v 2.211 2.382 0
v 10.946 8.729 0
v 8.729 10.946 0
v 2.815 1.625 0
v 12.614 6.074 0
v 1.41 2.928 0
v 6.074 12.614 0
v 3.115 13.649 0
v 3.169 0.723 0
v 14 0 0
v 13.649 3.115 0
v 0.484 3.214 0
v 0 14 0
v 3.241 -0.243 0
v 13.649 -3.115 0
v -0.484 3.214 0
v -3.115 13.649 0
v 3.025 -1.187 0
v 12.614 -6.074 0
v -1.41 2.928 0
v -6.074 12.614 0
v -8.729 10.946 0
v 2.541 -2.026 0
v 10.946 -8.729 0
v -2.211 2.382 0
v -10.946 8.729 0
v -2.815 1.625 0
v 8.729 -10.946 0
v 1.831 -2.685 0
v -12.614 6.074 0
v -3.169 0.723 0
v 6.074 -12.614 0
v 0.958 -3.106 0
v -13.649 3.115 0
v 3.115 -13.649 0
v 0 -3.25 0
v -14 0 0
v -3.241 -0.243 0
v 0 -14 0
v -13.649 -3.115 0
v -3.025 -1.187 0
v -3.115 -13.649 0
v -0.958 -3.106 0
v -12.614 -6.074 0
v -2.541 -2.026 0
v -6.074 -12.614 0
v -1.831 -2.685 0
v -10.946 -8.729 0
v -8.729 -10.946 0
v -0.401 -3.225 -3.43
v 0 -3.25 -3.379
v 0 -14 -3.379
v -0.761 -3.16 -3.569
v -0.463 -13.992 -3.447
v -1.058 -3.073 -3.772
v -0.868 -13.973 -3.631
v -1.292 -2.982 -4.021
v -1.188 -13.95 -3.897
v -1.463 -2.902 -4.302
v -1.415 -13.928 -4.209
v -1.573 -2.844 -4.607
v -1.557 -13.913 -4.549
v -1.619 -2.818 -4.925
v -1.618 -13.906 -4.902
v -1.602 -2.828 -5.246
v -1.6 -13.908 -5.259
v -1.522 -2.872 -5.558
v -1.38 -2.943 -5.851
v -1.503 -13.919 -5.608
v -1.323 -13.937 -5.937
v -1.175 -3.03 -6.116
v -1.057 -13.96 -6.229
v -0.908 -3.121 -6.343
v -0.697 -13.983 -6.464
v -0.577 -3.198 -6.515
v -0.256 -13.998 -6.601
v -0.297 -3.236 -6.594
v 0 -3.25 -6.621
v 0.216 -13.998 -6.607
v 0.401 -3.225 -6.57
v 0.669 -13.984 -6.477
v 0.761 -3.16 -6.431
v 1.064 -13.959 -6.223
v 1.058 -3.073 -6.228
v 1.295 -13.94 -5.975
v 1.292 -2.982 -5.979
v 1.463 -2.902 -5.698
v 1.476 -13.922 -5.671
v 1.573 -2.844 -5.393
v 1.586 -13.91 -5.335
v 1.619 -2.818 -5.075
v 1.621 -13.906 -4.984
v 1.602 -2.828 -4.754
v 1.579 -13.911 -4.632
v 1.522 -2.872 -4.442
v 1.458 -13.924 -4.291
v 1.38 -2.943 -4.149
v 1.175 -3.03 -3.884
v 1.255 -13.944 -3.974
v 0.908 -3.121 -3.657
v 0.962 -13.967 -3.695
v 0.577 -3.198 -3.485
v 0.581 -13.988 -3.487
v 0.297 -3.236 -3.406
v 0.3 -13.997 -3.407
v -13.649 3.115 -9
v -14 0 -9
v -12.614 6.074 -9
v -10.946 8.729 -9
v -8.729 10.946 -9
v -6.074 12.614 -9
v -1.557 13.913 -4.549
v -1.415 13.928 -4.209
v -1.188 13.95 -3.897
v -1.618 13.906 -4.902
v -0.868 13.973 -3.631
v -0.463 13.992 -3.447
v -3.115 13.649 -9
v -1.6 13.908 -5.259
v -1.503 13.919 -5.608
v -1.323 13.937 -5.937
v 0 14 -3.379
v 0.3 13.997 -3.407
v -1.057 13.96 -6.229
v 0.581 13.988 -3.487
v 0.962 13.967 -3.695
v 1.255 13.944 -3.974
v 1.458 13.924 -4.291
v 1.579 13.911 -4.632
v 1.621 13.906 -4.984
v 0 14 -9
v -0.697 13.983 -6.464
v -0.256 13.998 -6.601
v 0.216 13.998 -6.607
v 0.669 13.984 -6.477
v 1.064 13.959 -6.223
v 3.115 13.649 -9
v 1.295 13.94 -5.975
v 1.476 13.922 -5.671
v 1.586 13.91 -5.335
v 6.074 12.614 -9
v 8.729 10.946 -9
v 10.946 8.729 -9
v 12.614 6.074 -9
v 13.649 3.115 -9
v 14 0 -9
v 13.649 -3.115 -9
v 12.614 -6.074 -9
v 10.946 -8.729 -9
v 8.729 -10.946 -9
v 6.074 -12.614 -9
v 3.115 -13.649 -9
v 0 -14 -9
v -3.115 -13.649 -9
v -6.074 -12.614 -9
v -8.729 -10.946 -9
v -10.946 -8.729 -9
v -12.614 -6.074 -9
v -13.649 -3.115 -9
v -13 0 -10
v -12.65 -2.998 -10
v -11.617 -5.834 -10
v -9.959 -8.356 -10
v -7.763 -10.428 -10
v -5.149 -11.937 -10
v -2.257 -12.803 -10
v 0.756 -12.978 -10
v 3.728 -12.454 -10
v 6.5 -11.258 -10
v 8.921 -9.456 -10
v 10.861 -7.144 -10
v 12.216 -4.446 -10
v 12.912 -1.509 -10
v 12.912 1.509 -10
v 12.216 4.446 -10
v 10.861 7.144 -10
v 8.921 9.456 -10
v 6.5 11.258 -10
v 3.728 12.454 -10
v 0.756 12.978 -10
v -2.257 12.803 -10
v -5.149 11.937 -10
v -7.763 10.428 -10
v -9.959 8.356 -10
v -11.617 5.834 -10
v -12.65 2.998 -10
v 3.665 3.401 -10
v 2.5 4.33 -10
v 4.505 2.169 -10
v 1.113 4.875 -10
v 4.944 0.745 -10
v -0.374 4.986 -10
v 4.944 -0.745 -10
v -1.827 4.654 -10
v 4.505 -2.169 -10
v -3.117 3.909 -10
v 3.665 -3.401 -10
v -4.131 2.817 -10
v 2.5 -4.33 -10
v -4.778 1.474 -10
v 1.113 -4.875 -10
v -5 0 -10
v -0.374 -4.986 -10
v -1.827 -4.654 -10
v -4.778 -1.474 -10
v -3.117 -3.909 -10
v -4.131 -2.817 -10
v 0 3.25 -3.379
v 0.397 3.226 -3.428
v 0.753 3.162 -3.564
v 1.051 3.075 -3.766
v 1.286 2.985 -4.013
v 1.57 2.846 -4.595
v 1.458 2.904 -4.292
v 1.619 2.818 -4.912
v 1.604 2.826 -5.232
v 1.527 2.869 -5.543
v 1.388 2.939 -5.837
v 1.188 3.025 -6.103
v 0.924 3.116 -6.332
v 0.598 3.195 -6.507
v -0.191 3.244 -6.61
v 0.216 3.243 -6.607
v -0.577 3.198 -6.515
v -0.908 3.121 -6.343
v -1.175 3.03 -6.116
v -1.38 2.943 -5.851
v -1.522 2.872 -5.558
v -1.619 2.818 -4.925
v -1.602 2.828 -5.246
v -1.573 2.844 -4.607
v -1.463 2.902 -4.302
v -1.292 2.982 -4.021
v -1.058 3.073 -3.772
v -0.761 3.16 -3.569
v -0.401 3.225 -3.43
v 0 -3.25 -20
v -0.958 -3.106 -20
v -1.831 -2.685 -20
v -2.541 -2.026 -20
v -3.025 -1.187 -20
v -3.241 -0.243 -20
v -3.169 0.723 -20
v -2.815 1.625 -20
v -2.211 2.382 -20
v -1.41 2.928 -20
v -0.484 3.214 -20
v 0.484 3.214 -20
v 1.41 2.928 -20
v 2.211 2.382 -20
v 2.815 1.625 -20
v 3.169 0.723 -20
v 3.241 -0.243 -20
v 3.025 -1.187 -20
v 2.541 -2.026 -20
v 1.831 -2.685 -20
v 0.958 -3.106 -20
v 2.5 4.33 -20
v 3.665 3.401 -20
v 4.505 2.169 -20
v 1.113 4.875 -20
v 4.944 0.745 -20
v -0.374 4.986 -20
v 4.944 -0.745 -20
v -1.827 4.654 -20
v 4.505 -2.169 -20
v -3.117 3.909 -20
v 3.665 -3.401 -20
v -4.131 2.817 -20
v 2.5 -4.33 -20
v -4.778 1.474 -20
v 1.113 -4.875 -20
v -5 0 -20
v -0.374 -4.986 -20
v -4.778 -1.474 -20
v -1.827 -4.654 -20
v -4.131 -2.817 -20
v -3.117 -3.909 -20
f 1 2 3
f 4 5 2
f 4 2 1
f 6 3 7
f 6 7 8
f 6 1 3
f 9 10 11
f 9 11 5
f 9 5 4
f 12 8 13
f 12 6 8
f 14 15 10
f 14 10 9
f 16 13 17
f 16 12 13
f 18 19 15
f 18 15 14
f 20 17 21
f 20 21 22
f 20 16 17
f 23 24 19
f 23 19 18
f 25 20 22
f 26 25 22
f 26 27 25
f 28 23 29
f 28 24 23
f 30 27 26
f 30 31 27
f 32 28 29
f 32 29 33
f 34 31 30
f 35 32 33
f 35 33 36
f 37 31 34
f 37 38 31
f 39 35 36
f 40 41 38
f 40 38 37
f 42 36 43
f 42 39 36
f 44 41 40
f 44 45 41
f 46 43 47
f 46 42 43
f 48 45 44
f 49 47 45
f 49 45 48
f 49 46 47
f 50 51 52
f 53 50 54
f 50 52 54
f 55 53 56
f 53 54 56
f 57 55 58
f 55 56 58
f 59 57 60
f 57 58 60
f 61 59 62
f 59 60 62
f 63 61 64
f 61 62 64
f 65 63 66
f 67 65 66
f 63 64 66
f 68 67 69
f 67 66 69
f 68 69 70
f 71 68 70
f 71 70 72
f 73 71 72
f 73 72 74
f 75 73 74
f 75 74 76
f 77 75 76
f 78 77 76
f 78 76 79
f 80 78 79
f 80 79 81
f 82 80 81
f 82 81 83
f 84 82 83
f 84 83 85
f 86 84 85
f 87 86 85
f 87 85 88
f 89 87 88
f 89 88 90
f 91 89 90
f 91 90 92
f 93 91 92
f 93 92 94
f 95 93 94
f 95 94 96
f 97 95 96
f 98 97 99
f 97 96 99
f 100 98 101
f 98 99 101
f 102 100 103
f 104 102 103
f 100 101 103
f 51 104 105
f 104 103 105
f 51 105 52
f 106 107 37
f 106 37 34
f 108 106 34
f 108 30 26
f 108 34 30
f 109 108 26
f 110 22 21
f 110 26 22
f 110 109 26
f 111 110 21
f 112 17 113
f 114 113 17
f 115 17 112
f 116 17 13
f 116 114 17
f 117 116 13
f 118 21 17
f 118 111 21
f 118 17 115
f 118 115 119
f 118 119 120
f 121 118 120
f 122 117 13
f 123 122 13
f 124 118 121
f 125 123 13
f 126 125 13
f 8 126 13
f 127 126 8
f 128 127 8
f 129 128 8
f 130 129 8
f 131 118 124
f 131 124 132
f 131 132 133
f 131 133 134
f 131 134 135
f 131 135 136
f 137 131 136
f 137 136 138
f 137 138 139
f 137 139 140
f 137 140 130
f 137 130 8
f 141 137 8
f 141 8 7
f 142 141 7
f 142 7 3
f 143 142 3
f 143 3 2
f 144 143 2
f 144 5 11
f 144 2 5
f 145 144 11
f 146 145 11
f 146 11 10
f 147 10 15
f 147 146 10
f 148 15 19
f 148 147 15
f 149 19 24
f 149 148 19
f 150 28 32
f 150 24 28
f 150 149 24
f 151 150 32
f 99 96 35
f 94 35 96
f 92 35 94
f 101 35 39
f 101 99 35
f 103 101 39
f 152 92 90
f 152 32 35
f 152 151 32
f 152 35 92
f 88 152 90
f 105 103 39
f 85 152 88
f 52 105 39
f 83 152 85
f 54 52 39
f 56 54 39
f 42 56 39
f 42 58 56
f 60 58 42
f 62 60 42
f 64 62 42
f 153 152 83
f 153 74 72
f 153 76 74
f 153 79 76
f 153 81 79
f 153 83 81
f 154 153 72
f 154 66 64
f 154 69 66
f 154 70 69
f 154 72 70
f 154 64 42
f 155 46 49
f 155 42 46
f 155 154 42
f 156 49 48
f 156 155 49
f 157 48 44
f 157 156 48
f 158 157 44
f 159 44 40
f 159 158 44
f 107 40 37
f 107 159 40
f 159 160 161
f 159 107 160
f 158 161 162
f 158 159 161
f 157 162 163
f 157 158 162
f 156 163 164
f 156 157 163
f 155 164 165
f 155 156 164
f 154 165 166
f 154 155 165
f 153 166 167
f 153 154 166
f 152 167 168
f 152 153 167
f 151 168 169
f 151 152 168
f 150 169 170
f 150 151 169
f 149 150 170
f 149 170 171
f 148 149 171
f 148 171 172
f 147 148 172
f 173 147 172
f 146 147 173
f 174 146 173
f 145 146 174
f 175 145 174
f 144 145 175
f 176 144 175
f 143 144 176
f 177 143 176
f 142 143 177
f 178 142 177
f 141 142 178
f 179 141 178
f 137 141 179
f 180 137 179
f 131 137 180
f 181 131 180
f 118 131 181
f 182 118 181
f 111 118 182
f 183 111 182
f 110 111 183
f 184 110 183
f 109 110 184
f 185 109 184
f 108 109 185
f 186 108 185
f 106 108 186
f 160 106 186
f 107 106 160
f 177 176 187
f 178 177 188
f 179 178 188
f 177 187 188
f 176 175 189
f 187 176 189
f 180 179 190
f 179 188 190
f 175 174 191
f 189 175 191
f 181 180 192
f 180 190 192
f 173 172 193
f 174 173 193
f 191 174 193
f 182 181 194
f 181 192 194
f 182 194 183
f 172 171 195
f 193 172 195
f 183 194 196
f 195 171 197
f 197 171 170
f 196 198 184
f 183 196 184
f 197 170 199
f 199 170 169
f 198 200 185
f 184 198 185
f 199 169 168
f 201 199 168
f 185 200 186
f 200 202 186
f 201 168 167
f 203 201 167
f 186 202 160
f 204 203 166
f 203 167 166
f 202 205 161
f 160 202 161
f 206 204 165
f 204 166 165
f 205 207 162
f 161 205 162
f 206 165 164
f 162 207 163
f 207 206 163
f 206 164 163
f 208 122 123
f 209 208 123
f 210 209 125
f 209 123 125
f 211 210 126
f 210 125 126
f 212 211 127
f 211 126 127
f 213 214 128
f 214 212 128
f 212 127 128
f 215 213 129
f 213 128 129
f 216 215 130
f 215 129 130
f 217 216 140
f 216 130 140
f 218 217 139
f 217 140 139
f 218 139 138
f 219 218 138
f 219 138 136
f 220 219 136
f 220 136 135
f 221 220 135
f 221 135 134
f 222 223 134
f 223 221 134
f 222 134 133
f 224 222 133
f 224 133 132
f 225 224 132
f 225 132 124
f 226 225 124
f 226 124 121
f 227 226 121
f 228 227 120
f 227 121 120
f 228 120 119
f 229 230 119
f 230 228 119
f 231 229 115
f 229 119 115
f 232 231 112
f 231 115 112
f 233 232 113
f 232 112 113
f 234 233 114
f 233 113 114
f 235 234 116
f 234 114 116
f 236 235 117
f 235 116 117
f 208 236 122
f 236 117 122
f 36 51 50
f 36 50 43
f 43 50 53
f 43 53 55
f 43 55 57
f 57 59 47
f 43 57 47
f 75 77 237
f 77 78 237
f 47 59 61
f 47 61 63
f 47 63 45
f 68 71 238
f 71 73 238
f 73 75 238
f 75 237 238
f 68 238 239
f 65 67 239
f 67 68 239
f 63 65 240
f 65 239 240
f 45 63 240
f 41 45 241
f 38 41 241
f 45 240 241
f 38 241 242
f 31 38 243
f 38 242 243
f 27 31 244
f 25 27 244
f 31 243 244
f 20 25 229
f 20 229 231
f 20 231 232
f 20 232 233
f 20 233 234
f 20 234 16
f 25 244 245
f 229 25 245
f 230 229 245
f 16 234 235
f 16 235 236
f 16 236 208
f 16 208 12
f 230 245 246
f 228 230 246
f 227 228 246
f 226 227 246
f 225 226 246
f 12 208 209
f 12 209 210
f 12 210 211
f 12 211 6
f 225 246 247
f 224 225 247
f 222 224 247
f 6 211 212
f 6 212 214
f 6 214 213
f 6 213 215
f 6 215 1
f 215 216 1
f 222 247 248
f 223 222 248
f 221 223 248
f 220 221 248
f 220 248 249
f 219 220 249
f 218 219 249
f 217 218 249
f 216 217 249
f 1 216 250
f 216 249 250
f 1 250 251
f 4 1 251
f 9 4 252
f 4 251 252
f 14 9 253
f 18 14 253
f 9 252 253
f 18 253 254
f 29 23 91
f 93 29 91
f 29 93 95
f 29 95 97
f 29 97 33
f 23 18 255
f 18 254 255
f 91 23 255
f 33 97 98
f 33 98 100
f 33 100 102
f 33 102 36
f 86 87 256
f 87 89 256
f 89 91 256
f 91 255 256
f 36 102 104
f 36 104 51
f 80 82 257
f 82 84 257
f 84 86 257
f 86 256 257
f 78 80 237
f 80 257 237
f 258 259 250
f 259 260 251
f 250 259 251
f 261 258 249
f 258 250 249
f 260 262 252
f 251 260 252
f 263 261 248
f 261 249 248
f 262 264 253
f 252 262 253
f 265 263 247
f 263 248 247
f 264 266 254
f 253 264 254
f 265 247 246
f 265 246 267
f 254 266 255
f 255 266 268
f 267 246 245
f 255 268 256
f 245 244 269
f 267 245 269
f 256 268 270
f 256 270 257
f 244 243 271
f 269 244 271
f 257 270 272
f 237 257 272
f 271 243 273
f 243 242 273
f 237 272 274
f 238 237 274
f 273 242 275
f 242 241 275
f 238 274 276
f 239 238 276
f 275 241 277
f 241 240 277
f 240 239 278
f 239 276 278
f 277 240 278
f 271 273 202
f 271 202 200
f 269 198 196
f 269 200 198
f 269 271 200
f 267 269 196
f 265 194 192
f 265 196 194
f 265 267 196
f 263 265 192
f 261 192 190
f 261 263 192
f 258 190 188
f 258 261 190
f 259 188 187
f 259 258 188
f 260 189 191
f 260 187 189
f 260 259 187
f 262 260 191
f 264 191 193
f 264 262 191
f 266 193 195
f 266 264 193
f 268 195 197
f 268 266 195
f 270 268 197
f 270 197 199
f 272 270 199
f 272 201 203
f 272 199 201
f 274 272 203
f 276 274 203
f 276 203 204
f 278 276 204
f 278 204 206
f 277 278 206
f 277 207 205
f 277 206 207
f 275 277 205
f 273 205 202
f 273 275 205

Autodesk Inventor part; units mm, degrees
ref_plane "YZ Plane" through (0, 0, 0) normal (1, 0, 0) x (0, 1, 0)
ref_plane "XZ Plane" through (0, 0, 0) normal (0, 1, 0) x (-1, 0, 0)
ref_plane "XY Plane" through (0, 0, 0) normal (0, 0, 1) x (1, 0, 0)
sketch "Skizze1" plane through (0, 0, 0) normal (0, 1, 0) x (-1, 0, 0)
  line L0 (0, 0) -> (14, 0)
  line L1 (14, 0) -> (14, -10)
  line L2 (14, -10) -> (5, -10)
  line L3 (5, -10) -> (5, -20)
  line L4 (5, -20) -> (0, -20)
  line L5 (0, -20) -> (0, 0)
  point P0 (9.5, -10)
  dimension "d0" = 10
  dimension "d1" = 10
  dimension "d2" = 10
  dimension "d3" = 28
revolve "Umdrehung1" add sketch "Skizze1" angle 360 about axis through (0, 0, -20) along (0, 0, 1)
sketch "Skizze2" plane through (0, 0, 0) normal (0, 0, 1) x (1, 0, 0)
  circle A0 centre (0, 0) radius 14 projected
  point P0 (0, 0)
hole "Bohrung1" at (0, 0, 0) direction (0, 0, -1) diameter 6.5 depth 20
sketch "Skizze4" plane through (0, 0, 0) normal (0, 1, 0) x (-1, 0, 0)
  line L0 (-3.25, 0) -> (3.25, 0) projected
  point P0 (0, 0)
  point P1 (0, -5)
  dimension "d12" = 5
hole "Bohrung2" at (0, 0, -5) direction (0, -1, 0) diameter 3.242 end through all thread size "M4x0.7" class "6H" standard "ISO Metric profile"
mirror "Spiegeln1" about plane through (0, 0, 0) normal (0, 1, 0) of "Bohrung2"
chamfer "Fasen1" distance 1 angle 45 1 edges at (14, 0, -10)
properties part number "30" material "Kupfer"
